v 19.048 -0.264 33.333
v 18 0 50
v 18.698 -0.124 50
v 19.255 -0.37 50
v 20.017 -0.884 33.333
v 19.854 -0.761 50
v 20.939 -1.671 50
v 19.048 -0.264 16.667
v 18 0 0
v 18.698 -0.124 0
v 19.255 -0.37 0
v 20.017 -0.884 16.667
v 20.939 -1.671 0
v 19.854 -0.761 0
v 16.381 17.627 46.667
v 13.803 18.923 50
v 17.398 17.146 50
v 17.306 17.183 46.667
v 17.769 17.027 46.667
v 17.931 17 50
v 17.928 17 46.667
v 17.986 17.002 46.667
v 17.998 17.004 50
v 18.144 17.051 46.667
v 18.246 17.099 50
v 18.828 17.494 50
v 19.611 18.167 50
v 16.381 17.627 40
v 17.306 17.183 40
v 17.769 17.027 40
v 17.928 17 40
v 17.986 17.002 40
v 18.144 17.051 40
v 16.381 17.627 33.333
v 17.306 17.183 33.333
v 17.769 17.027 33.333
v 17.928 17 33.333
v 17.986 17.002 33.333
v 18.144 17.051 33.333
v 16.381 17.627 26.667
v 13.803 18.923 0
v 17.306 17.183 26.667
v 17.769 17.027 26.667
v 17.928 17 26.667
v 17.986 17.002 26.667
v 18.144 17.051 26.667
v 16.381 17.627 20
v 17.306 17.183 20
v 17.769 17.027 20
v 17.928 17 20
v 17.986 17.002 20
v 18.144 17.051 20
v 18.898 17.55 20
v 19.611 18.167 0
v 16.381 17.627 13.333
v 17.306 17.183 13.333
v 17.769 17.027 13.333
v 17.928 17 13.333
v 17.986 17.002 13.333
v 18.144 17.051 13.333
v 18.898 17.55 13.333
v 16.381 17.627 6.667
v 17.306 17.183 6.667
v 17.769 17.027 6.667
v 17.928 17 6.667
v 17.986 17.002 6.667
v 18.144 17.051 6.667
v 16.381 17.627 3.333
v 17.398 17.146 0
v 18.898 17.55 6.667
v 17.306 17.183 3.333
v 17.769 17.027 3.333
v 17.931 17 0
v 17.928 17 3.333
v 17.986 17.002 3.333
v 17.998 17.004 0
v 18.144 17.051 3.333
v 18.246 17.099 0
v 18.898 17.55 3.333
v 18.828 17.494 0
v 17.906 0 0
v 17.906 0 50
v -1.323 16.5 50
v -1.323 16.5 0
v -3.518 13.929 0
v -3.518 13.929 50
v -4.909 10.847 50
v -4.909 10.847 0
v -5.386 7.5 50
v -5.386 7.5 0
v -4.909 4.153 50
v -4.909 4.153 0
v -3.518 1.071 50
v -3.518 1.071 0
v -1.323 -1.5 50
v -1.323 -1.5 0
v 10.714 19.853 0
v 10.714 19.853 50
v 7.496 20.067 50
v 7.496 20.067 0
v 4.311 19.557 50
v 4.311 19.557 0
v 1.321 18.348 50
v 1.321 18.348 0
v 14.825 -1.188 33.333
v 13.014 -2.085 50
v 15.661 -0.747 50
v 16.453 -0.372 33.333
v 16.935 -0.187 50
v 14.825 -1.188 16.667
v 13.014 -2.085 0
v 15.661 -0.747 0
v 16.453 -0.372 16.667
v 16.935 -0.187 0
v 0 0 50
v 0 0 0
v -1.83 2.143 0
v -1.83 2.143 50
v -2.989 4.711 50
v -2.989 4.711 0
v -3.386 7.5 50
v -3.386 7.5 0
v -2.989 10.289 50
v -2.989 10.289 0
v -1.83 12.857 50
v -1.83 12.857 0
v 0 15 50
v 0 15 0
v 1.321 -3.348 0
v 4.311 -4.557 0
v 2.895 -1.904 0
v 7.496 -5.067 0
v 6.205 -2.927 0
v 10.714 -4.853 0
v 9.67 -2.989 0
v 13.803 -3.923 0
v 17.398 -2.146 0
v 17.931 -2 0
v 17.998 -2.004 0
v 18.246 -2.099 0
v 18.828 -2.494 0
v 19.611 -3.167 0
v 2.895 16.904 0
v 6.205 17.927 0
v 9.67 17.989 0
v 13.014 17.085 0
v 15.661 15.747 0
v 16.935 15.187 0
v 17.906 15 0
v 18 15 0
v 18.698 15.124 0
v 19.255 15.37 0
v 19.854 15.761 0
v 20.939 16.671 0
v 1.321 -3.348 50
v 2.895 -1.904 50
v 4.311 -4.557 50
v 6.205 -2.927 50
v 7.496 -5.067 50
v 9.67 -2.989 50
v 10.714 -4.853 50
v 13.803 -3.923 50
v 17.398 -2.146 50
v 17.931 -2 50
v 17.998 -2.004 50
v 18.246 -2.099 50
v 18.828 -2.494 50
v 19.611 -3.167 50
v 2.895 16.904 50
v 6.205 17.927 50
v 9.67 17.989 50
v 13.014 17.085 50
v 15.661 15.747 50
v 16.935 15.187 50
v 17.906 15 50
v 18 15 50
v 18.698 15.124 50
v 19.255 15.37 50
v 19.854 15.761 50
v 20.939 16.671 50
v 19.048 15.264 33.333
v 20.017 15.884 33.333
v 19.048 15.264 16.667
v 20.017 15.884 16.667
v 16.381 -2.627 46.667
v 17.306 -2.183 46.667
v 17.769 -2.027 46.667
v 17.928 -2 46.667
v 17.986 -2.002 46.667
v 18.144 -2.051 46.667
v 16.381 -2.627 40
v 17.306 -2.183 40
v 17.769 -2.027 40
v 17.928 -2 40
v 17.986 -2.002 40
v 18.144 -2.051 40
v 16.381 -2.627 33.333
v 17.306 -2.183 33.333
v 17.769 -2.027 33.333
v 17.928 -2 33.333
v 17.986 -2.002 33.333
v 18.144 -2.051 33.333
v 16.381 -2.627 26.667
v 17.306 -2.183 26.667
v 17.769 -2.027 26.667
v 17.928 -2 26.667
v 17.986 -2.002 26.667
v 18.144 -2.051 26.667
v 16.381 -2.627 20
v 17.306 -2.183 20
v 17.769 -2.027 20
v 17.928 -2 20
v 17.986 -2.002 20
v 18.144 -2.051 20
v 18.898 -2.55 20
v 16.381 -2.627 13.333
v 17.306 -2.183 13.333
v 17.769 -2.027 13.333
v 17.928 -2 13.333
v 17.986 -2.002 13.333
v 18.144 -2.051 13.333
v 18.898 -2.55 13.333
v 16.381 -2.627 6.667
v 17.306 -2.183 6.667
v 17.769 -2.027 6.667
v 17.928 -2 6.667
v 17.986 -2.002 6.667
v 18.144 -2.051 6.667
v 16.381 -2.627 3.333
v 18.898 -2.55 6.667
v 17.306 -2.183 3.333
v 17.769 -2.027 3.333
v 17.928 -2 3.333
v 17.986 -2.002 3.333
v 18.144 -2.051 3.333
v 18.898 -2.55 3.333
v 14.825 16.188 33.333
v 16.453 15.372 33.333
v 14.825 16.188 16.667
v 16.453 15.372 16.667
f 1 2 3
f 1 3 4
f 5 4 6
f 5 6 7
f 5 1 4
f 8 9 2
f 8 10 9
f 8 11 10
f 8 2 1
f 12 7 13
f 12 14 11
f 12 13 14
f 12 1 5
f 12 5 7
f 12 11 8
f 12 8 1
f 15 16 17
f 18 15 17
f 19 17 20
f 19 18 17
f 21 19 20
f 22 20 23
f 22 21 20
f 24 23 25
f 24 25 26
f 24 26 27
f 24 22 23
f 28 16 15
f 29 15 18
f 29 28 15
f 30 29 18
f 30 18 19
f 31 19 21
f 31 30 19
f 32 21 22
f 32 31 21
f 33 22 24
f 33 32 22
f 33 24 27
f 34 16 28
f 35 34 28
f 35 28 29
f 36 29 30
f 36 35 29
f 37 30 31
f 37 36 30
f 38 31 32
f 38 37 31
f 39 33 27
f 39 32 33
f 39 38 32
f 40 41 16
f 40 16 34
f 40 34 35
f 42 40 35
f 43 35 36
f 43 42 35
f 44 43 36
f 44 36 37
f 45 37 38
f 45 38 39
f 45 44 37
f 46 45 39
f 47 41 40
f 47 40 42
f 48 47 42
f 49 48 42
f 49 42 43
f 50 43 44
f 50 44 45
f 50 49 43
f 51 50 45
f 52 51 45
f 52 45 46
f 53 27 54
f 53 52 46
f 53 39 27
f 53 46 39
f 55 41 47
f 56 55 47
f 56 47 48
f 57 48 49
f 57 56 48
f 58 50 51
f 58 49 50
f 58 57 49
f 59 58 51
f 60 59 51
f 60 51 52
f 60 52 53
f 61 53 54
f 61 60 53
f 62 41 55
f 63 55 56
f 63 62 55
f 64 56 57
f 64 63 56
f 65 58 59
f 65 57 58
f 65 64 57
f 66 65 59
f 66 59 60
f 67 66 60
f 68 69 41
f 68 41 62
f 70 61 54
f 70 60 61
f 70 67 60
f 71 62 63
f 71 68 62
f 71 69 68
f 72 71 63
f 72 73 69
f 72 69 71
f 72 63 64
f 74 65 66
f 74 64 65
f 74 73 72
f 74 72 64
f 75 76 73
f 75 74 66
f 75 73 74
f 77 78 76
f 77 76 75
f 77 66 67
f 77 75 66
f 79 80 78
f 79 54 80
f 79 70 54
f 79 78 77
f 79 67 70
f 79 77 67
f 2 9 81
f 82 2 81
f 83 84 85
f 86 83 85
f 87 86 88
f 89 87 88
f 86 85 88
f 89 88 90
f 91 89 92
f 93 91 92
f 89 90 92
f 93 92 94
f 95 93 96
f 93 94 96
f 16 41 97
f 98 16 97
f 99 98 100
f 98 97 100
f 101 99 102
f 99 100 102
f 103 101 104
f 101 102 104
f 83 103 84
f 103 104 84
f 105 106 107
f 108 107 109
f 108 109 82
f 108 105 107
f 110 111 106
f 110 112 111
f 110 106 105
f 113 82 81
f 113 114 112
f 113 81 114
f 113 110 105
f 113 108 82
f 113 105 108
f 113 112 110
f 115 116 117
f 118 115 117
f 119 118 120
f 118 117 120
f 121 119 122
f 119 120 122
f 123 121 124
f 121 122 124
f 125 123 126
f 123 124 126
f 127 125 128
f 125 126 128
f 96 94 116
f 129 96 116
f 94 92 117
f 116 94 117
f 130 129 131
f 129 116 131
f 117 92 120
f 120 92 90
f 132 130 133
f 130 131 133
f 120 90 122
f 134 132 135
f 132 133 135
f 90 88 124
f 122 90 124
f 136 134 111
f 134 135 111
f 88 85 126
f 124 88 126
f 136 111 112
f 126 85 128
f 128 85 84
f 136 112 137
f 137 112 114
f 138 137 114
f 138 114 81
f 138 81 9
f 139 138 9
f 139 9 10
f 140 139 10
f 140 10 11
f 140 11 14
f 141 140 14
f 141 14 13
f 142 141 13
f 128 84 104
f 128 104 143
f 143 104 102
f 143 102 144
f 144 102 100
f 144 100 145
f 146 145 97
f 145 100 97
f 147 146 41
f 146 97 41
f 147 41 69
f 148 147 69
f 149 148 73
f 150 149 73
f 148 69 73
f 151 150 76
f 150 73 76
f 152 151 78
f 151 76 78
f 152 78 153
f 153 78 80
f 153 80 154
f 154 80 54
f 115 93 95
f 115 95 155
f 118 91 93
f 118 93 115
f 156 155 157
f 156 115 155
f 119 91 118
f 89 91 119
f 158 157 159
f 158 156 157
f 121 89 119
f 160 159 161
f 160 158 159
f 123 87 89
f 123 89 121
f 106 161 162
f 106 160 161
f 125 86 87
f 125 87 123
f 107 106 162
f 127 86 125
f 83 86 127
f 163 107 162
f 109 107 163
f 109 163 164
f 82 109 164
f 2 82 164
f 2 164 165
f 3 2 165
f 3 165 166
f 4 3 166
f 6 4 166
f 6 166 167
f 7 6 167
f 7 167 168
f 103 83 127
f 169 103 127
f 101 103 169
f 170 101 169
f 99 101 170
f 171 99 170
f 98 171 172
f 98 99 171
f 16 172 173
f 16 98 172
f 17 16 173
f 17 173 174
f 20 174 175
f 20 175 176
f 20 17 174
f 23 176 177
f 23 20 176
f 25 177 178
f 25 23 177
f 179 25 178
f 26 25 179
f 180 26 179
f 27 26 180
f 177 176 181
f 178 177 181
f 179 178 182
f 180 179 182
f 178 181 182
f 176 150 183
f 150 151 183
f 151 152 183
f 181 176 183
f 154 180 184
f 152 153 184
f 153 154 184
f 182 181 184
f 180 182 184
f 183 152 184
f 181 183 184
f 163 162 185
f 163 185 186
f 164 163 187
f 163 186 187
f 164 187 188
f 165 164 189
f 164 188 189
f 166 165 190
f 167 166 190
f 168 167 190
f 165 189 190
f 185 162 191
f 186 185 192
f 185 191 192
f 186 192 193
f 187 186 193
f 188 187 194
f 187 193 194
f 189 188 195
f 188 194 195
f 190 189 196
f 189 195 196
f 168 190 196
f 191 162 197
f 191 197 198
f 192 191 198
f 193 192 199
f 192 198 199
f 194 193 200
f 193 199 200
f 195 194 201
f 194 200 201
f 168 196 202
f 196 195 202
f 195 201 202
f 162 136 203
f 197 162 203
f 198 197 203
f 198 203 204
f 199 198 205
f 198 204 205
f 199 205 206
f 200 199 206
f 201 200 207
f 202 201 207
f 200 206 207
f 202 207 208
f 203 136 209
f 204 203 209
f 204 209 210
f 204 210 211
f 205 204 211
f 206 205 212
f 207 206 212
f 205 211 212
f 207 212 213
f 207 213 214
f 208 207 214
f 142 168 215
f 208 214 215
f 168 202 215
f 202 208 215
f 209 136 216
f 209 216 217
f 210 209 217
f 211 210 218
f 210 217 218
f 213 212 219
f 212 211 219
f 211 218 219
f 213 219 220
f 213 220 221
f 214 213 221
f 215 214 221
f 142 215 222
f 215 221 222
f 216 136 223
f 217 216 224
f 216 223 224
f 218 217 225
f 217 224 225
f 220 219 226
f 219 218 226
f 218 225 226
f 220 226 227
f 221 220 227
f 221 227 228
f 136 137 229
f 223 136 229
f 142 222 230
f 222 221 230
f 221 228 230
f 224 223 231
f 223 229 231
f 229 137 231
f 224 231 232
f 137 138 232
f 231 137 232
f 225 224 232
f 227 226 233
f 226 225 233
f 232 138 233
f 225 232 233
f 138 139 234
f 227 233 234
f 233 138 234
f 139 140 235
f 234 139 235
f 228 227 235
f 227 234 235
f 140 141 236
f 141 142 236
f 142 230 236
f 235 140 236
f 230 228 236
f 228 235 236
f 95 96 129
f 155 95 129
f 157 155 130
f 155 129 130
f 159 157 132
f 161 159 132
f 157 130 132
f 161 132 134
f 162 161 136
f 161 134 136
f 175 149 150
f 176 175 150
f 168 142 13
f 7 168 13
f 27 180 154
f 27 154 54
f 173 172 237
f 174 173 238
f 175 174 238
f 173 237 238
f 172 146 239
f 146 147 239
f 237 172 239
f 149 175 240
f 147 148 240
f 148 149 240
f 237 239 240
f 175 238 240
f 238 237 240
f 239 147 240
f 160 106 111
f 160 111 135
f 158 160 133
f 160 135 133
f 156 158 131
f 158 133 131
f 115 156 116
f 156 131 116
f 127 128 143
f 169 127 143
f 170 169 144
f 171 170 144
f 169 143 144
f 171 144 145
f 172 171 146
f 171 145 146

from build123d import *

# Parameters (mm, degrees)
F1_DEPTH = 50


# Not quite as in the source:
# - the dataset's text gives a spline's control points without its knots; the knots are read off the source's solid


with BuildPart() as f1:
    # F0 (on Top) → F1 (new body)
    with BuildSketch(Plane.XY):
        with BuildLine():
            ThreePointArc((13.0144933843, -2.085252316), (6.205255597, -2.9274153897), (0, 0))
            ThreePointArc((0, 0), (-3.3856217223, 7.5), (0, 15))
            ThreePointArc((0, 15), (6.205255597, 17.9274153897), (13.0144933843, 17.085252316))
            add(Edge.make_bspline(
                [(13.0144933843, 17.085252316), (14.9188937147, 16.2688716797), (16.5381459826, 15.0282447438), (17.9057964085, 15)],
                knots=[0, 0, 0, 0, 0.5457987429, 0.5457987429, 0.5457987429, 0.5457987429], degree=3))
            Line((17.9057964085, 15), (18, 15))
            add(Edge.make_bspline(
                [(18, 15), (19.0972191031, 15.0230880512), (20.0302273141, 15.8645970051), (20.9385249764, 16.6705846786)],
                knots=[0.5583835876, 0.5583835876, 0.5583835876, 0.5583835876, 1, 1, 1, 1], degree=3))
            Line((20.9385249764, 16.6705846786), (19.6110748236, 18.1665379172))
            add(Edge.make_bspline(
                [(13.8027239443, 18.9233743561), (14.3068240335, 18.7072663795), (15.238145762, 18.2426302327), (16.2240017083, 17.7036956521), (16.8916980315, 17.3645051566), (17.3205970551, 17.1709950677), (17.6036754274, 17.0697214684), (17.7738298239, 17.0243049098), (17.8699589675, 17.0058001031), (17.9347425496, 16.9993397818), (17.9615712094, 16.9993392849), (17.983336855, 17.0011188424), (18.031156036, 17.0095932598), (18.1317450508, 17.0407501327), (18.3942332342, 17.1702266018), (18.8744768256, 17.5122343093), (19.3516165065, 17.9363047964), (19.6110748236, 18.1665379172)],
                knots=[1.83025e-05, 1.83025e-05, 1.83025e-05, 1.83025e-05, 0.125, 0.25, 0.3125, 0.375, 0.4375, 0.46875, 0.5, 0.53125, 0.5625, 0.59375, 0.625, 0.6875, 0.75, 0.875, 1, 1, 1, 1], degree=3))
            ThreePointArc((13.8027239307, 18.9233743619), (5.8889598851, 19.9022462774), (-1.3228756555, 16.5))
            ThreePointArc((-1.3228756555, 16.5), (-5.3856217223, 7.5), (-1.3228756555, -1.5))
            ThreePointArc((-1.3228756555, -1.5), (5.8889598851, -4.9022462774), (13.8027239307, -3.9233743619))
            add(Edge.make_bspline(
                [(13.8027239443, -3.9233743561), (14.3068240335, -3.7072663795), (15.238145762, -3.2426302327), (16.2240017083, -2.7036956521), (16.8916980315, -2.3645051566), (17.3205970551, -2.1709950677), (17.6036754274, -2.0697214684), (17.7738298239, -2.0243049098), (17.8699589675, -2.0058001031), (17.9347425496, -1.9993397818), (17.9615712094, -1.9993392849), (17.983336855, -2.0011188424), (18.031156036, -2.0095932598), (18.1317450508, -2.0407501327), (18.3942332342, -2.1702266018), (18.8744768256, -2.5122343093), (19.3516165065, -2.9363047964), (19.6110748236, -3.1665379172)],
                knots=[1.83025e-05, 1.83025e-05, 1.83025e-05, 1.83025e-05, 0.125, 0.25, 0.3125, 0.375, 0.4375, 0.46875, 0.5, 0.53125, 0.5625, 0.59375, 0.625, 0.6875, 0.75, 0.875, 1, 1, 1, 1], degree=3))
            Line((19.6110748236, -3.1665379172), (20.9385249764, -1.6705846786))
            add(Edge.make_bspline(
                [(18, 0), (19.0972191031, -0.0230880512), (20.0302273141, -0.8645970051), (20.9385249764, -1.6705846786)],
                knots=[0.5583835876, 0.5583835876, 0.5583835876, 0.5583835876, 1, 1, 1, 1], degree=3))
            Line((18, 0), (17.9057964085, 0))
            add(Edge.make_bspline(
                [(13.0144933843, -2.085252316), (14.9188937147, -1.2688716797), (16.5381459826, -0.0282447438), (17.9057964085, 0)],
                knots=[0, 0, 0, 0, 0.5457987429, 0.5457987429, 0.5457987429, 0.5457987429], degree=3))
        make_face()
    extrude(amount=F1_DEPTH)


solid = f1.part
